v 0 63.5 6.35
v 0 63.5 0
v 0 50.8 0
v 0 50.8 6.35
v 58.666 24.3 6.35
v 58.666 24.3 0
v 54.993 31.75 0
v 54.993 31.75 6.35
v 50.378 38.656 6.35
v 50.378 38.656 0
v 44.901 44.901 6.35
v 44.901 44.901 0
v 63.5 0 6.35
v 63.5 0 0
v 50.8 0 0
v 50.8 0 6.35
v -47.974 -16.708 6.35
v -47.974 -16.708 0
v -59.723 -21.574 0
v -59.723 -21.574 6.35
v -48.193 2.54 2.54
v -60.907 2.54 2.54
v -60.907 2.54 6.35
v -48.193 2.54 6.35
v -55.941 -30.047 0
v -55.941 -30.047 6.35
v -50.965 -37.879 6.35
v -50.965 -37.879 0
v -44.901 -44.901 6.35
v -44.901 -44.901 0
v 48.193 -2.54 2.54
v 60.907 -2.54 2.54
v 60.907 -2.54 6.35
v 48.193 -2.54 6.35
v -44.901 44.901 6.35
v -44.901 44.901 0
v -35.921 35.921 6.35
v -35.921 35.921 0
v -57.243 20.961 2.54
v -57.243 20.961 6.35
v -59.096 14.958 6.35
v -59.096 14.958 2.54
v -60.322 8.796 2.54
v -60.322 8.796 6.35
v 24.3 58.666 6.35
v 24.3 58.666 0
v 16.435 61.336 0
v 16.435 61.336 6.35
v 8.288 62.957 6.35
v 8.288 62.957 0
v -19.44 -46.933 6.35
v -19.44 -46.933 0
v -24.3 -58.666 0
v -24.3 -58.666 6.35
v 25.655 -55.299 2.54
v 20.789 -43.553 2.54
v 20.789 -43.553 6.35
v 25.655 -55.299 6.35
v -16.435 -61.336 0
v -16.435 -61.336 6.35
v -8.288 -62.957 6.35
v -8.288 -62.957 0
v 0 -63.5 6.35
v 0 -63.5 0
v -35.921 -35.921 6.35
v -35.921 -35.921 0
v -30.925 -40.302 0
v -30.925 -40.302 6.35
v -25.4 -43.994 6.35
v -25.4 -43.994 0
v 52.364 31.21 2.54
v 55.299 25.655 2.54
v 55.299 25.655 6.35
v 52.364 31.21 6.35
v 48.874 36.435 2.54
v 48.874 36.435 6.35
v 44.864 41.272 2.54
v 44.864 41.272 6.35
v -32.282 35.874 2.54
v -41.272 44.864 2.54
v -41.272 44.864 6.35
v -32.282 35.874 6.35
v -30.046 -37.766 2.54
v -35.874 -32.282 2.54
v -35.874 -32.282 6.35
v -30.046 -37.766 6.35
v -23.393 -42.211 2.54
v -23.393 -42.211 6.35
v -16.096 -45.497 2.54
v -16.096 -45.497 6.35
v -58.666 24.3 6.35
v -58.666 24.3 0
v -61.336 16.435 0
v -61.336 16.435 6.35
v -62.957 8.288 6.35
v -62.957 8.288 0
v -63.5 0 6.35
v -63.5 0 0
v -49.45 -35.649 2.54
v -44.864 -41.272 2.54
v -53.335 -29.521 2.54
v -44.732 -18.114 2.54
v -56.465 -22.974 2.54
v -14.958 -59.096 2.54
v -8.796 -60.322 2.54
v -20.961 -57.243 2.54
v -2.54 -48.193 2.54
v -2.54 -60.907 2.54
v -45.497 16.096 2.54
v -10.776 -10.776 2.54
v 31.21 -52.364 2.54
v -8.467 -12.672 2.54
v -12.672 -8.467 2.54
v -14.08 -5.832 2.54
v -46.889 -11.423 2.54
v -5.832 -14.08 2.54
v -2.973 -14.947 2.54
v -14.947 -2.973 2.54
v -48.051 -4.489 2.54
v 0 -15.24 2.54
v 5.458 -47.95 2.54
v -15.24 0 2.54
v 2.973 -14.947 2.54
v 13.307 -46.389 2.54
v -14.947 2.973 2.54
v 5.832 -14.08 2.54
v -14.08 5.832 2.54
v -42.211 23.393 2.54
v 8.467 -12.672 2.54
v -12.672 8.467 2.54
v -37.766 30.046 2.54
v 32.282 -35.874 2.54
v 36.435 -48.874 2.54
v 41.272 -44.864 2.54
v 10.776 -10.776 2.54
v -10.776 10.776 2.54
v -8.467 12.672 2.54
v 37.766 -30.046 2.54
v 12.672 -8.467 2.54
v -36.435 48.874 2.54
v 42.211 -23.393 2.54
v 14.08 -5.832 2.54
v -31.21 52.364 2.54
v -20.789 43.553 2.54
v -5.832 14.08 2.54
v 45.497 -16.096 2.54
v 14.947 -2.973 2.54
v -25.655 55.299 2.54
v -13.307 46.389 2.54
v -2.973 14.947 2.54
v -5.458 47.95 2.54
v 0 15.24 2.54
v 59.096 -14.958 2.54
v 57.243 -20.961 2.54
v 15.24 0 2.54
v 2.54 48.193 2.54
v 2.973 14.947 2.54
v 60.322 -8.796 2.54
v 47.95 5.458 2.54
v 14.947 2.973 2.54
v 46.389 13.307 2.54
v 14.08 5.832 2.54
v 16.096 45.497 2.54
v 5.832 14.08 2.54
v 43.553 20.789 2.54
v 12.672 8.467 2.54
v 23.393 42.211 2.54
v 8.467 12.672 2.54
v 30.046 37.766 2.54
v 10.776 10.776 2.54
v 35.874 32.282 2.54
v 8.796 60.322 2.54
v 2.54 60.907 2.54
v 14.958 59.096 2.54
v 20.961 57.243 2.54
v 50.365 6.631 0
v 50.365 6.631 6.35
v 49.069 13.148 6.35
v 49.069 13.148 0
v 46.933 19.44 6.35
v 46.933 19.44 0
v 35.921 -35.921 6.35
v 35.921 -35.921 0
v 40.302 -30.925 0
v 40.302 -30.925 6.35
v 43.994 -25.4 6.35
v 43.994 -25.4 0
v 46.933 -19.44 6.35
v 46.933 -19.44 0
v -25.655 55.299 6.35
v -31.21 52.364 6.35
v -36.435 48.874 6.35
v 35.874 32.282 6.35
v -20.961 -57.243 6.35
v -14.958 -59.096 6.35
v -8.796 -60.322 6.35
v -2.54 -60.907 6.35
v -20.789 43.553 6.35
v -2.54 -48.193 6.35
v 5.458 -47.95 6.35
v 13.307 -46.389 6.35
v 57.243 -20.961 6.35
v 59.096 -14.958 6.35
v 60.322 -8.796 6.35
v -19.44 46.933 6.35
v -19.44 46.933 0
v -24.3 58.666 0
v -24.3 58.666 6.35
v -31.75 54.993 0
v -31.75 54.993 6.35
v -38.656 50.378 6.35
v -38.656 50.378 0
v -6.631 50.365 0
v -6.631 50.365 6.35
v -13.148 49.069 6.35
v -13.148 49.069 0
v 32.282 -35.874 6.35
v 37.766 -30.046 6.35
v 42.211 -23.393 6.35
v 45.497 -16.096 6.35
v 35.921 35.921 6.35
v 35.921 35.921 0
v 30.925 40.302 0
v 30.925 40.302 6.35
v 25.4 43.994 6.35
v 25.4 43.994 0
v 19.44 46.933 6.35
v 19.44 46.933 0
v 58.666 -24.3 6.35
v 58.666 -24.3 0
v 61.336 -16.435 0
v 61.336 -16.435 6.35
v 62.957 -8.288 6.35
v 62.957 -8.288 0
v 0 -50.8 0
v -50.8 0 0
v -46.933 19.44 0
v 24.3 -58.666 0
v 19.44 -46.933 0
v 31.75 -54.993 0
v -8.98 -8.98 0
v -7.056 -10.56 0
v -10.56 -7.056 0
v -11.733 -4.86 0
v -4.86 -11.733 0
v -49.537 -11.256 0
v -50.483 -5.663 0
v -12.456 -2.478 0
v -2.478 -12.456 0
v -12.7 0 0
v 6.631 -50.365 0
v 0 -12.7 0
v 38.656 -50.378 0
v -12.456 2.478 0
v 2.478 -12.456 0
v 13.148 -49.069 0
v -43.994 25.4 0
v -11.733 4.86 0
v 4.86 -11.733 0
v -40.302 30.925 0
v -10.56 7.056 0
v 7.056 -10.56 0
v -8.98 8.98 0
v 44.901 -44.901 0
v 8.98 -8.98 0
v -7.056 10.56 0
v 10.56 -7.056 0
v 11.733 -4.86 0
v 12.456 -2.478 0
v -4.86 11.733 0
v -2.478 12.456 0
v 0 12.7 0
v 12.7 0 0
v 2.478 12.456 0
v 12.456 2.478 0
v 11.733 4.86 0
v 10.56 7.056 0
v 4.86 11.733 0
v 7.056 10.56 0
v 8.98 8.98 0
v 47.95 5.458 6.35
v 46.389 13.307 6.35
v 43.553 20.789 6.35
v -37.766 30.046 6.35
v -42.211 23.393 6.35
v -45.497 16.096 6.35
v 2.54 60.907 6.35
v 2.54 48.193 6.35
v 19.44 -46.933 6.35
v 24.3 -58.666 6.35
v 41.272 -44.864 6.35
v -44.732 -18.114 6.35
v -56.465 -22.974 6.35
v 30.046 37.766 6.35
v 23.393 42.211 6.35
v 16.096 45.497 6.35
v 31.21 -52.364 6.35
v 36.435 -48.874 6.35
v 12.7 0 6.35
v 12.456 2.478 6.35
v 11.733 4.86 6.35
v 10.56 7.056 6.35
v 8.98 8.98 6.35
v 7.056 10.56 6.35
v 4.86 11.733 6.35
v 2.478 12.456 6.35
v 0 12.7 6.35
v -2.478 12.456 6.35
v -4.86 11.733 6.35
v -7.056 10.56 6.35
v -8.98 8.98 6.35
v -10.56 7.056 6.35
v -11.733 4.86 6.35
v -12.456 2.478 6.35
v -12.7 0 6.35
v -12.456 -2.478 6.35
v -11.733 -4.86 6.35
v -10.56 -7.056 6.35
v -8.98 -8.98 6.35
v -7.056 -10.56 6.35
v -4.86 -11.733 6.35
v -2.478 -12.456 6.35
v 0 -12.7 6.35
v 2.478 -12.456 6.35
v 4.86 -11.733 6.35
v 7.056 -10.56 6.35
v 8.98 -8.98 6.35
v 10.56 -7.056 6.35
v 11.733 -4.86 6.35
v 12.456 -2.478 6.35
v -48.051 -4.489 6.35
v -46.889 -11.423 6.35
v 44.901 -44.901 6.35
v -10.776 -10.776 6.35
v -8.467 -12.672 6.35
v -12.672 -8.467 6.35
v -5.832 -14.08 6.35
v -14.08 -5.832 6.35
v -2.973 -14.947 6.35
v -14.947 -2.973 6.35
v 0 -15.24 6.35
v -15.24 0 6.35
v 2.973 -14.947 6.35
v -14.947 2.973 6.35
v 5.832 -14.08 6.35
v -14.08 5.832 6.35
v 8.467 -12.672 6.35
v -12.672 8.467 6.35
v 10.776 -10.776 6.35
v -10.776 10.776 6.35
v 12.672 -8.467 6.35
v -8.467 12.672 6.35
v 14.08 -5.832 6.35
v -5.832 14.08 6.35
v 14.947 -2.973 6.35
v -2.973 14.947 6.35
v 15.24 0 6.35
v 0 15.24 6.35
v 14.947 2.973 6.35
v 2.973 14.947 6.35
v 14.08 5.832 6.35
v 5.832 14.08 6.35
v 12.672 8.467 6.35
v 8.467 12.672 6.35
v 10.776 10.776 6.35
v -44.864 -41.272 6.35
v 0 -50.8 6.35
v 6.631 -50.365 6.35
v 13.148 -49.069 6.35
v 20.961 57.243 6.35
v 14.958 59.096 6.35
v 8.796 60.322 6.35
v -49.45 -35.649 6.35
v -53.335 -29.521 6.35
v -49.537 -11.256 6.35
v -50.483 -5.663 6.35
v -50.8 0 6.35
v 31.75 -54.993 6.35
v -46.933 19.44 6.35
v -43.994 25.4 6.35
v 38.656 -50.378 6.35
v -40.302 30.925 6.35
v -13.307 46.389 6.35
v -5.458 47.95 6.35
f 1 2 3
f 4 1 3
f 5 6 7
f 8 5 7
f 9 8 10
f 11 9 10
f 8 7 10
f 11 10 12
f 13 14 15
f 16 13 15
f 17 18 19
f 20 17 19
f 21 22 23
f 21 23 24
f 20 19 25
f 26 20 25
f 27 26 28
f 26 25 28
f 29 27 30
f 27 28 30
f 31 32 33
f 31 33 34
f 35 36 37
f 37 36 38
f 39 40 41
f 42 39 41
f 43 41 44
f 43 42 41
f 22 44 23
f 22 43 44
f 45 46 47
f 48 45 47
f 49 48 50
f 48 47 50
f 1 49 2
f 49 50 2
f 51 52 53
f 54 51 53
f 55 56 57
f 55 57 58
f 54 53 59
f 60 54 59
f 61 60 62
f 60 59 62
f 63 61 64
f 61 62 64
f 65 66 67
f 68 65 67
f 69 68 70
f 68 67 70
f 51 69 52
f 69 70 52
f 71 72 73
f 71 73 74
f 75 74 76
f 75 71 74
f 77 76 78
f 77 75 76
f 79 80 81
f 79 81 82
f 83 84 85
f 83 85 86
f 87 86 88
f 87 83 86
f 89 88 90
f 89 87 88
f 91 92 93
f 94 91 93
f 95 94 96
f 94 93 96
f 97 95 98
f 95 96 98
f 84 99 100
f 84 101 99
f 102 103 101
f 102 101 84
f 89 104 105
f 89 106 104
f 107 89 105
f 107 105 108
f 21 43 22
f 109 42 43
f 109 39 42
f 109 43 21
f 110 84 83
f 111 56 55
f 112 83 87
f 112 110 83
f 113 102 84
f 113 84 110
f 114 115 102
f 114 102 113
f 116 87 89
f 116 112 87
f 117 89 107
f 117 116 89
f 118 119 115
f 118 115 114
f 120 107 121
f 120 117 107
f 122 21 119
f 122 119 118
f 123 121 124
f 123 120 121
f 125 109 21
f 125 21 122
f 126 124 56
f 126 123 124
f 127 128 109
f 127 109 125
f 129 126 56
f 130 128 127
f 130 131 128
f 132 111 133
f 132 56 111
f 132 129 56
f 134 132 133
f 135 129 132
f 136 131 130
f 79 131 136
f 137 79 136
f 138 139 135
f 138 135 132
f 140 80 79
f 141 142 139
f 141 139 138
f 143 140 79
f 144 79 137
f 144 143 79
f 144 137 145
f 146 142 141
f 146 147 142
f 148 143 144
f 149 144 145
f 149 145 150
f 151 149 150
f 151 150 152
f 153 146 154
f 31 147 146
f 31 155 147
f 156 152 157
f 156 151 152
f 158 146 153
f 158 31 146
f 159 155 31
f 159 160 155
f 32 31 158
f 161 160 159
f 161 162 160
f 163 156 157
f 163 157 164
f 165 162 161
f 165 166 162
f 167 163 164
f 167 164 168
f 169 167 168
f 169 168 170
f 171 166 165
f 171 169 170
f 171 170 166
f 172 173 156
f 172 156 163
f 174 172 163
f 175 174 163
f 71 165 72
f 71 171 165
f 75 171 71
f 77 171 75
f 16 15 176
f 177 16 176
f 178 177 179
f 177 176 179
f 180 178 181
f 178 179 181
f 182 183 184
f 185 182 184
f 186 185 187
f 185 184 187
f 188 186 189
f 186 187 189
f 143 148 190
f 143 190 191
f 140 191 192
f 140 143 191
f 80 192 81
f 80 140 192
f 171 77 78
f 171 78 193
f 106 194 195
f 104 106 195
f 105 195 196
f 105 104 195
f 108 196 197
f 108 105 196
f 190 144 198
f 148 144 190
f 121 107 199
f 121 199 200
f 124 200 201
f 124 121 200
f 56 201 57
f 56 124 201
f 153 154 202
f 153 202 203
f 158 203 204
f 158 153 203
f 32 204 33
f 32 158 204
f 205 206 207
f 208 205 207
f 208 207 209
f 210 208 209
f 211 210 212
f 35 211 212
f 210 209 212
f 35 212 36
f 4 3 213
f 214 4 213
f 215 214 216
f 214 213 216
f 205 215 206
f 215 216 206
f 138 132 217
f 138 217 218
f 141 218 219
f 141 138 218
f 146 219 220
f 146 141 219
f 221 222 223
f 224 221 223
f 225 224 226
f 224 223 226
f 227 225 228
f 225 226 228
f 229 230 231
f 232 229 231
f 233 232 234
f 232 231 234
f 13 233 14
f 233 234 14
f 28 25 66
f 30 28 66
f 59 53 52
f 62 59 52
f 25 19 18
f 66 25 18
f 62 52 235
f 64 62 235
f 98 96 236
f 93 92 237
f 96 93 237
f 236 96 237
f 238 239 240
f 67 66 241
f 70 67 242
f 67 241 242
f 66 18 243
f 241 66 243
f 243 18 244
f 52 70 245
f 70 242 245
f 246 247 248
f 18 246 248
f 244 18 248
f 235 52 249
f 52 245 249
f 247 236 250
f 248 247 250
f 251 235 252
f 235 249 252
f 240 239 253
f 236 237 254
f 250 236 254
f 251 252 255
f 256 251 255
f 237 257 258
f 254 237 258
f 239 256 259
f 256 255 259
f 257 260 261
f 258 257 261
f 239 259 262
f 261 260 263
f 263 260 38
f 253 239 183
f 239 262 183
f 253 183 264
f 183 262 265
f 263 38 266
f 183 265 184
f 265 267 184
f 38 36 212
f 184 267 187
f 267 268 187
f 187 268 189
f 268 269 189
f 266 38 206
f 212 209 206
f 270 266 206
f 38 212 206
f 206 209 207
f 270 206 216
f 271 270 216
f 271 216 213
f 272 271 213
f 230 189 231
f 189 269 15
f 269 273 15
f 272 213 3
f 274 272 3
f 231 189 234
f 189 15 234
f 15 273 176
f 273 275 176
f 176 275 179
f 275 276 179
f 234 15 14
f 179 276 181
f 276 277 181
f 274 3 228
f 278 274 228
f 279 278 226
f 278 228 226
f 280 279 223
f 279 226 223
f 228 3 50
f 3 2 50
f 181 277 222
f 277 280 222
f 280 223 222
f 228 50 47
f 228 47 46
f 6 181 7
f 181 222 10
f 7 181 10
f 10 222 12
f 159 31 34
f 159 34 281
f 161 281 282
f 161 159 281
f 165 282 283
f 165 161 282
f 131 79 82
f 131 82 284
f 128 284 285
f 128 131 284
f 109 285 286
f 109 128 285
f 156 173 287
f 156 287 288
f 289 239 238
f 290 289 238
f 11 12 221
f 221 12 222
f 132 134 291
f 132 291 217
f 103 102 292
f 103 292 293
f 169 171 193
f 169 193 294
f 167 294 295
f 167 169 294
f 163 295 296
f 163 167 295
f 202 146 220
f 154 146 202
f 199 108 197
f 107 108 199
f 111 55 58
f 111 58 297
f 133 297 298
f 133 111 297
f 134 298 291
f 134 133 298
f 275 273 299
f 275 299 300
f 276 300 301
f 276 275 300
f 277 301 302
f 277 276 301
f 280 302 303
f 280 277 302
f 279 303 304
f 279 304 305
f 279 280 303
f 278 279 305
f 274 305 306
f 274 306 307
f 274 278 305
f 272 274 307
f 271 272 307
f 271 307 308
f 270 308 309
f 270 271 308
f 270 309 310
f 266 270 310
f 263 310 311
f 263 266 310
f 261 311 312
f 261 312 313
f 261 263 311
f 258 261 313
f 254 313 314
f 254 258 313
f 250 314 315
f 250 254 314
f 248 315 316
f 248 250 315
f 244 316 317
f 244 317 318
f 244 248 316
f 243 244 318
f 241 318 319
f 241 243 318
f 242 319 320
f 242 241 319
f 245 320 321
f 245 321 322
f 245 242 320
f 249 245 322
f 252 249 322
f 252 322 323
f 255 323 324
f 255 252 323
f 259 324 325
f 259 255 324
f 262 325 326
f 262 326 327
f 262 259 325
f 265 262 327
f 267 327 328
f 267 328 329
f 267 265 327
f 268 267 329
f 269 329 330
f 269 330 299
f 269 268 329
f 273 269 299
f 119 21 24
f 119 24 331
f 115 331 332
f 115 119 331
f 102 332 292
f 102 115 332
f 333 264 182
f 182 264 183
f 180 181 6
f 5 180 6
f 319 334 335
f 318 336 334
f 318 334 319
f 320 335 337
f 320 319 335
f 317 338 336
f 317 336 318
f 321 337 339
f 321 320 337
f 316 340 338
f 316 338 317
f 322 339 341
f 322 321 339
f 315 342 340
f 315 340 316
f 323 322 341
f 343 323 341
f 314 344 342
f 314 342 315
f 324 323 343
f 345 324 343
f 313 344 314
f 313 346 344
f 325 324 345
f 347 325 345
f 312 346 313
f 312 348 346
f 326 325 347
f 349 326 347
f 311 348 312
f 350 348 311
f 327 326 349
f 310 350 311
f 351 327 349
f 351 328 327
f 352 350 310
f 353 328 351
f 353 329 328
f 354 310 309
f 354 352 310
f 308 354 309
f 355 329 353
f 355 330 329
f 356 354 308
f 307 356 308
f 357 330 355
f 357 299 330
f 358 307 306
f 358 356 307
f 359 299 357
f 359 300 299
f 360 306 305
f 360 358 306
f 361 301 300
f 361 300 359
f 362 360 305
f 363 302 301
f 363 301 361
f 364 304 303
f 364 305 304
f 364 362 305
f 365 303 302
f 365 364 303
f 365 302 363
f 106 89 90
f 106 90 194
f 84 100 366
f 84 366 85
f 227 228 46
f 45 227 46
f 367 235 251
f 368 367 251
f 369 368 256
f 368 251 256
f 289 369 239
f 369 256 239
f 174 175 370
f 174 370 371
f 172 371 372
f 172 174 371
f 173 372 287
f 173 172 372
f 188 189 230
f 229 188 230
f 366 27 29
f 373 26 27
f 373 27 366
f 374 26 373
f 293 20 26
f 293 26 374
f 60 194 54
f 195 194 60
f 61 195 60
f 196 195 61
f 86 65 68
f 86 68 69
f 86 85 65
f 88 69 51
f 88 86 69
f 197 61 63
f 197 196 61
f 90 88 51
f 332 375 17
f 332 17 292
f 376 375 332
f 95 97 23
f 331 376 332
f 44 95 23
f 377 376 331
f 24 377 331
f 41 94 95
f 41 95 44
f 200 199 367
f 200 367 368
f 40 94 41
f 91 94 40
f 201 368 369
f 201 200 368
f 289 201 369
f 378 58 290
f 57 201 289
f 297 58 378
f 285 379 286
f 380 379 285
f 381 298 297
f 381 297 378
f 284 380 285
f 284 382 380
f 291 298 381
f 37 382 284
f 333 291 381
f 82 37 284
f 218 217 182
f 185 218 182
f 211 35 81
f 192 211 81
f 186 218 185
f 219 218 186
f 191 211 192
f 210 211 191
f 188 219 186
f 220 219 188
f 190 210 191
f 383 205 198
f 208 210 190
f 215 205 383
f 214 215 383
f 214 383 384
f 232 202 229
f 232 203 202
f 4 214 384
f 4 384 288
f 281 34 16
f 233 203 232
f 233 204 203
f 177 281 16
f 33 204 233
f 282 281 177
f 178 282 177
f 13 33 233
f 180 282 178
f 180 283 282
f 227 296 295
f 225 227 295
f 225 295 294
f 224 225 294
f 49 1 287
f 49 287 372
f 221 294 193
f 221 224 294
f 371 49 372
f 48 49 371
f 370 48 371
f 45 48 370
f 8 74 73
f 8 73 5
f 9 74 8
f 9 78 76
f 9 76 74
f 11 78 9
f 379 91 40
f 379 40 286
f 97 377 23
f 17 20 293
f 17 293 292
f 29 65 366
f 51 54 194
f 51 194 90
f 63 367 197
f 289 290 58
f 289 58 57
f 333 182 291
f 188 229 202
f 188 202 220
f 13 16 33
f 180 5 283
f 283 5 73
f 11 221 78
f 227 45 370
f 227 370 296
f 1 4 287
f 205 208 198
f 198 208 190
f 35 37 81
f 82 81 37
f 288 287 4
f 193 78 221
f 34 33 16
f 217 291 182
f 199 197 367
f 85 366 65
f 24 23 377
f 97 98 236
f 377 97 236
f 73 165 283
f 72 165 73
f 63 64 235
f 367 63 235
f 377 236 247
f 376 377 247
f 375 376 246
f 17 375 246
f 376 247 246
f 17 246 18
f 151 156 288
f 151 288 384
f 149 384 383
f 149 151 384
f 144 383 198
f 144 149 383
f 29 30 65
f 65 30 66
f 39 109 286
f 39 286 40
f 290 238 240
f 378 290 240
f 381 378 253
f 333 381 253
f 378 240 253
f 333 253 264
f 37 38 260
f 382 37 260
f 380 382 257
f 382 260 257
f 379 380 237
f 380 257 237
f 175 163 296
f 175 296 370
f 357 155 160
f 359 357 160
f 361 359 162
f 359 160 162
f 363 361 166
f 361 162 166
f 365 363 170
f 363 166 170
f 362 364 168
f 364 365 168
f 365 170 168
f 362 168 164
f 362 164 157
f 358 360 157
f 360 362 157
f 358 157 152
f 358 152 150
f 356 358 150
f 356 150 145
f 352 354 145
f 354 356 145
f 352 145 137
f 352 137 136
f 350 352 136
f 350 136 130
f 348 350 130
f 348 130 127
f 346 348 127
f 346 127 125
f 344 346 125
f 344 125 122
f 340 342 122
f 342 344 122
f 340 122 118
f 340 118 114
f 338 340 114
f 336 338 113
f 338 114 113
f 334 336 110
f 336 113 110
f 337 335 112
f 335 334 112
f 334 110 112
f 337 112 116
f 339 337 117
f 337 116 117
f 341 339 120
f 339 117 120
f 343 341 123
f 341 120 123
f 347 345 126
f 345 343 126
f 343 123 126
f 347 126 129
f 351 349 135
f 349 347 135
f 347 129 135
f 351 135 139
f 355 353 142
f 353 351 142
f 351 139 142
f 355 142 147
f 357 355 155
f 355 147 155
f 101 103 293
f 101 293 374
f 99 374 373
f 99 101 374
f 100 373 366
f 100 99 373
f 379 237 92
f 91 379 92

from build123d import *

# Parameters (mm, degrees)
F0_R     = 12.7
F1_DEPTH = 6.35
F2_T     = -2.54


with BuildPart() as f1:
    # F0 (on Top) → F1 (new body)
    with BuildSketch(Plane.XY):
        with BuildLine():
            Line((-46.9330802516, 19.4403183641), (-58.6663503145, 24.3003979552))
            ThreePointArc((-58.6663503145, 24.3003979552), (-62.2798653056, 12.388235448), (-63.5, 0))
            Line((-63.5, 0), (-50.8, 0))
            ThreePointArc((-50.8, 0), (-50.0884898607, -8.4724957052), (-47.9738904144, -16.7076580798))
            Line((-47.9738904144, -16.7076580798), (-59.7227298995, -21.5741867367))
            ThreePointArc((-59.7227298995, -21.5741867367), (-53.5964944807, -34.0538658507), (-44.9012806053, -44.9012806053))
            Line((-44.9012806053, -44.9012806053), (-35.9210244843, -35.9210244843))
            ThreePointArc((-35.9210244843, -35.9210244843), (-28.2229678374, -42.238656305), (-19.4403183641, -46.9330802516))
            Line((-19.4403183641, -46.9330802516), (-24.3003979552, -58.6663503145))
            ThreePointArc((-24.3003979552, -58.6663503145), (-12.388235448, -62.2798653056), (0, -63.5))
            Line((0, -63.5), (0, -50.8))
            ThreePointArc((0, -50.8), (9.9105883584, -49.8238922445), (19.4403183641, -46.9330802516))
            Line((19.4403183641, -46.9330802516), (24.3003979552, -58.6663503145))
            ThreePointArc((24.3003979552, -58.6663503145), (35.2787097967, -52.7983203812), (44.9012806053, -44.9012806053))
            Line((44.9012806053, -44.9012806053), (35.9210244843, -35.9210244843))
            ThreePointArc((35.9210244843, -35.9210244843), (42.238656305, -28.2229678374), (46.9330802516, -19.4403183641))
            Line((46.9330802516, -19.4403183641), (58.6663503145, -24.3003979552))
            ThreePointArc((58.6663503145, -24.3003979552), (62.2798653056, -12.388235448), (63.5, 0))
            Line((63.5, 0), (50.8, 0))
            ThreePointArc((50.8, 0), (49.8238922445, 9.9105883584), (46.9330802516, 19.4403183641))
            Line((46.9330802516, 19.4403183641), (58.6663503145, 24.3003979552))
            ThreePointArc((58.6663503145, 24.3003979552), (52.7983203812, 35.2787097967), (44.9012806053, 44.9012806053))
            Line((44.9012806053, 44.9012806053), (35.9210244843, 35.9210244843))
            ThreePointArc((35.9210244843, 35.9210244843), (28.2229678374, 42.238656305), (19.4403183641, 46.9330802516))
            Line((19.4403183641, 46.9330802516), (24.3003979552, 58.6663503145))
            ThreePointArc((24.3003979552, 58.6663503145), (12.388235448, 62.2798653056), (0, 63.5))
            Line((0, 63.5), (0, 50.8))
            ThreePointArc((0, 50.8), (-9.9105883584, 49.8238922445), (-19.4403183641, 46.9330802516))
            Line((-19.4403183641, 46.9330802516), (-24.3003979552, 58.6663503145))
            ThreePointArc((-24.3003979552, 58.6663503145), (-35.2787097967, 52.7983203812), (-44.9012806053, 44.9012806053))
            Line((-44.9012806053, 44.9012806053), (-35.9210244843, 35.9210244843))
            ThreePointArc((-35.9210244843, 35.9210244843), (-42.238656305, 28.2229678374), (-46.9330802516, 19.4403183641))
        make_face()
        Circle(F0_R, mode=Mode.SUBTRACT)
    extrude(amount=F1_DEPTH)

    # F2
    f2_openings = [f1.faces().sort_by_distance(p)[0] for p in [
        (-34.280877, 51.304958, 6.35),
    ]]
    offset(amount=F2_T, openings=f2_openings, kind=Kind.INTERSECTION)


solid = f1.part
